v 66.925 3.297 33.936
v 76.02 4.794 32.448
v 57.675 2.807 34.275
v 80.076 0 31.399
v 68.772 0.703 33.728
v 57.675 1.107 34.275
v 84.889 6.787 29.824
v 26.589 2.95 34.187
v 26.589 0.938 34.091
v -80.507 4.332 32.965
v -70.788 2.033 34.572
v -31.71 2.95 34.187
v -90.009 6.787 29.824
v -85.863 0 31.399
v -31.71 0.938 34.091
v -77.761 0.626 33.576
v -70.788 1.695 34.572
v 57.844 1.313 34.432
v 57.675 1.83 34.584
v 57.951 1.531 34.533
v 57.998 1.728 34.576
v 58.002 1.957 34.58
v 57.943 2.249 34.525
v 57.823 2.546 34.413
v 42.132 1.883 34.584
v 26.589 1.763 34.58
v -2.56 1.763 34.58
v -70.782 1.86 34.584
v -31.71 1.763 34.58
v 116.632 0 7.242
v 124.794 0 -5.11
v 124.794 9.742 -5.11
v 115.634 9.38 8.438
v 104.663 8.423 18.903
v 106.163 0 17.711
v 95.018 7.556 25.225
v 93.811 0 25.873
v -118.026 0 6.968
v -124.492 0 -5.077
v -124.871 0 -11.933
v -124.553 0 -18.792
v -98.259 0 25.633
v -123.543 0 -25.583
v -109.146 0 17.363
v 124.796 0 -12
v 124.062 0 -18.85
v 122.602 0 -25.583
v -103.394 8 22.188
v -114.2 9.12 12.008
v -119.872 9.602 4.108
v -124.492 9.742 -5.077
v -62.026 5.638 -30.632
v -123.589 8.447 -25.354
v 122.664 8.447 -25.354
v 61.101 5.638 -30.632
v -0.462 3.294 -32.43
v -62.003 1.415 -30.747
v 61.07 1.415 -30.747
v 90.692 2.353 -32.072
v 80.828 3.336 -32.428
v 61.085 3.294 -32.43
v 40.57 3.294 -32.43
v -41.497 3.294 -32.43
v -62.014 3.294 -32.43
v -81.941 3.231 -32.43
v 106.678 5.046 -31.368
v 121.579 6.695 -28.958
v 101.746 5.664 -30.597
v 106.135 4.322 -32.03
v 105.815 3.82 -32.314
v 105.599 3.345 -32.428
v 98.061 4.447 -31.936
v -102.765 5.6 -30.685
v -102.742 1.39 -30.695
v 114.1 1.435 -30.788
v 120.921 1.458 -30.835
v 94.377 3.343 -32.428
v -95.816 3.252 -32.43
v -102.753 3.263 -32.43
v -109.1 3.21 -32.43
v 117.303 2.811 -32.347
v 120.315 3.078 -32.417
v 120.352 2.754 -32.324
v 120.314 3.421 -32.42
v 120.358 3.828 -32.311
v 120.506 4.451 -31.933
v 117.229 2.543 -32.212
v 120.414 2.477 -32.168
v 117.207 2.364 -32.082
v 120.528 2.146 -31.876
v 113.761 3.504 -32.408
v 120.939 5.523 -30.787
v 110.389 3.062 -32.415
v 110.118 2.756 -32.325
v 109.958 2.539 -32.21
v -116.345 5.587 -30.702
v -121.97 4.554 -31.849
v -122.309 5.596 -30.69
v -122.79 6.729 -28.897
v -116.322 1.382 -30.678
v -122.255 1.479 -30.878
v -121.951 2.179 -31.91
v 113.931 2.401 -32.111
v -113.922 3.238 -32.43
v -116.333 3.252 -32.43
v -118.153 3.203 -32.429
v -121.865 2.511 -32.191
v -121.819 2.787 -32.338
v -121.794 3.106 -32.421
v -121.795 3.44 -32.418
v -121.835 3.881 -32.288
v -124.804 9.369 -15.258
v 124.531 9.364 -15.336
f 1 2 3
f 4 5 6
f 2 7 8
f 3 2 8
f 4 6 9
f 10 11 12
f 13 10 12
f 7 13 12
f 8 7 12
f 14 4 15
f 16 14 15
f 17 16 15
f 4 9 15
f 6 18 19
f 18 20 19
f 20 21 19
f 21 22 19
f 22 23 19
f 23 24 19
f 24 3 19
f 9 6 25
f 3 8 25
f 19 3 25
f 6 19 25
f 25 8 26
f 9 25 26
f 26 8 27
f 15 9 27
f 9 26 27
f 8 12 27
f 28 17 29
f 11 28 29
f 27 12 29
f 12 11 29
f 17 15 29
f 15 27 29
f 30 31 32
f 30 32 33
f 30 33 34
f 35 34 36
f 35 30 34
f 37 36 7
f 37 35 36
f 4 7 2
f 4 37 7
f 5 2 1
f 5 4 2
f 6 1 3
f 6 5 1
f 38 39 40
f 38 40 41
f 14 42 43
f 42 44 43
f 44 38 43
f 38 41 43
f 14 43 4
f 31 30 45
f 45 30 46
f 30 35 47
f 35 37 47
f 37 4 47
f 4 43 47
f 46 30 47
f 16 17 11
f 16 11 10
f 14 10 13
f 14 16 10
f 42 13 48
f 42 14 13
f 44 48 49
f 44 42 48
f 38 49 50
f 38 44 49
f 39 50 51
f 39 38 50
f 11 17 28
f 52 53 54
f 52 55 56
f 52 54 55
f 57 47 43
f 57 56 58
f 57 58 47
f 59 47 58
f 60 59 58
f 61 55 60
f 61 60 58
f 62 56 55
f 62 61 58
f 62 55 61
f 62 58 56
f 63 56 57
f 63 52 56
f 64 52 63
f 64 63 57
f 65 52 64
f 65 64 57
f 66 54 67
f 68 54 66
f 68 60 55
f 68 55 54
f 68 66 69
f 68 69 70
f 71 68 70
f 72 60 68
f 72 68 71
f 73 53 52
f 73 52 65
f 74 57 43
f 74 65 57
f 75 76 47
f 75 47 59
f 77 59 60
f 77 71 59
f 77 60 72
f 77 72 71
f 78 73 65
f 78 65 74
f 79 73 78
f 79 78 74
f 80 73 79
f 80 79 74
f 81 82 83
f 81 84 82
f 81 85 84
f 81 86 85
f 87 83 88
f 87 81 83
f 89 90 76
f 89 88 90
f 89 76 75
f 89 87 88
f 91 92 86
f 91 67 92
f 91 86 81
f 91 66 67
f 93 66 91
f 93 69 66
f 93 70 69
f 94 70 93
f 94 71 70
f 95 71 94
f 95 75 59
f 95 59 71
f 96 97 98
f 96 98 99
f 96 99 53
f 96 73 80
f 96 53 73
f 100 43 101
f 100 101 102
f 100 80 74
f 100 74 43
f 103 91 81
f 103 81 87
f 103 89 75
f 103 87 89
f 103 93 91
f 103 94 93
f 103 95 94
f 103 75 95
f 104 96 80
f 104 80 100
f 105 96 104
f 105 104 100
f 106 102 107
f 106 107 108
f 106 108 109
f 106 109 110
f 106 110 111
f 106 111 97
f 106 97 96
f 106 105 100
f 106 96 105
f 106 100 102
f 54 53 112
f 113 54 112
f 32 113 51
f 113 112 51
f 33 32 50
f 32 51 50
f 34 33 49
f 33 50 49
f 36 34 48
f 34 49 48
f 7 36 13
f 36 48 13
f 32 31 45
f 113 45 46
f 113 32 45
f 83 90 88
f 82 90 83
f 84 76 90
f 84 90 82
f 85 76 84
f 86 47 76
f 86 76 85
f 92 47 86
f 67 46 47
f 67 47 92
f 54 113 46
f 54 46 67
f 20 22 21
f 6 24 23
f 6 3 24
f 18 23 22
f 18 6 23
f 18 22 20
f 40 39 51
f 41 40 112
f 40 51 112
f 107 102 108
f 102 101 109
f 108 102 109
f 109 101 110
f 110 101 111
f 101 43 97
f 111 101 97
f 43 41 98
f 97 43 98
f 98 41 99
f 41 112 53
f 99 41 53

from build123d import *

# Parameters (mm, degrees)
SKETCH1_W                = 250
SKETCH1_H                = 70
BOSS_EXTRUDE1_DEPTH      = 10
CUT_EXTRUDE1_DEPTH       = 10
CUT_EXTRUDE2_DEPTH       = 10
CUT_EXTRUDE7_DEPTH       = 131.083540302
CUT_EXTRUDE7_DEPTH_BACK  = 131.083540302
CUT_EXTRUDE12_DEPTH      = 131.064564638
CUT_EXTRUDE12_DEPTH_BACK = 131.064564638
CUT_EXTRUDE15_DEPTH      = 10
CUT_EXTRUDE16_DEPTH      = 10
CUT_EXTRUDE21_DEPTH      = 131.064564638
CUT_EXTRUDE21_DEPTH_BACK = 131.064564638


with BuildPart() as part:
    # Sketch1 → Boss-Extrude1 (new body)
    with BuildSketch(Plane(origin=(0, 0, 0), x_dir=(1, 0, 0), z_dir=(0, 1, 0))):
        Rectangle(SKETCH1_W, SKETCH1_H)
    extrude(amount=BOSS_EXTRUDE1_DEPTH)

    # Sketch2 → Cut-Extrude1 (cut)
    with BuildSketch(Plane(origin=(0, 10, 0), x_dir=(1, 0, 0), z_dir=(0, 1, 0))):
        with BuildLine():
            Line((-125, -35), (-105.6811507, -35))
            ThreePointArc((-105.6811507, -35), (-123.319359291, -2.181448179), (-120.931126211, 35))
            Line((-120.931126211, 35), (-125, 35))
            Line((-125, 35), (-125, -35))
        make_face()
        with BuildLine():
            ThreePointArc((-102.585198357, -37.985491478), (-104.15687903, -36.517327288), (-105.6811507, -35))
            Line((-105.6811507, -35), (-125, -35))
            Line((-125, -35), (-125, 35))
            Line((-125, 35), (-120.931126211, 35))
            ThreePointArc((-120.931126211, 35), (-117.77369036, 42.419291873), (-113.756908851, 49.410769495))
            ThreePointArc((-113.756908851, 49.410769495), (-123.297106068, 68.789133967), (-141.939517672, 79.697702256))
            ThreePointArc((-141.939517672, 79.697702256), (-176.738011892, 49.445919486), (-154.950429467, 8.808414484))
            ThreePointArc((-154.950429467, 8.808414484), (-179.373061386, -41.265354418), (-129.299292485, -65.687986337))
            ThreePointArc((-129.299292485, -65.687986337), (-103.552743859, -63.784193915), (-102.585198357, -37.985491478))
        make_face()
    extrude(amount=-CUT_EXTRUDE1_DEPTH, mode=Mode.SUBTRACT)

    # Sketch3 → Cut-Extrude2 (cut)
    with BuildSketch(Plane(origin=(0, 10, 0), x_dir=(1, 0, 0), z_dir=(0, 1, 0))):
        with BuildLine():
            ThreePointArc((107.670924145, -35.29278609), (124.046120338, -1.80913671), (119.157389799, 35.142211572))
            ThreePointArc((119.157389799, 35.142211572), (134.08963077, 47.557806696), (153.427471124, 45.778269352))
            ThreePointArc((153.427471124, 45.778269352), (237.062768876, 49.332031087), (168.624576004, 1.127197211))
            ThreePointArc((168.624576004, 1.127197211), (150.729727191, -38.140394783), (107.670924145, -35.29278609))
        make_face()
    extrude(amount=-CUT_EXTRUDE2_DEPTH, mode=Mode.SUBTRACT)

    # Sketch7 → Cut-Extrude7 (cut, two sides: drawn at the far end of the back side and taken through both)
    with BuildSketch(Plane(origin=(0, 0, 0), x_dir=(0, 0, -1), z_dir=(1, 0, 0)).offset(-CUT_EXTRUDE7_DEPTH_BACK)):
        with BuildLine():
            ThreePointArc((33.533398698, 7.292236255), (-1.467141086, 9.688614292), (-36.298819038, 5.501177851))
            ThreePointArc((-36.298819038, 5.501177851), (-59.137780951, 12.031911856), (-75.102753404, 29.621349666))
            ThreePointArc((-75.102753404, 29.621349666), (-94.212515617, 81.478521501), (-38.963674899, 82.862314097))
            ThreePointArc((-38.963674899, 82.862314097), (26.341939645, 119.615559451), (63.095184998, 54.309944906))
            ThreePointArc((63.095184998, 54.309944906), (106.612811455, -5.853362128), (33.533398698, 7.292236255))
        make_face()
    extrude(amount=CUT_EXTRUDE7_DEPTH + CUT_EXTRUDE7_DEPTH_BACK, mode=Mode.SUBTRACT)

    # Sketch8 → Cut-Extrude12 (cut, two sides: drawn at the far end of the back side and taken through both)
    with BuildSketch(Plane(origin=(0, 0, 0), x_dir=(0, 0, -1), z_dir=(1, 0, 0)).offset(-CUT_EXTRUDE12_DEPTH_BACK)):
        with BuildLine():
            Line((-28.066580628, 7.960156192), (-42.709897039, 11.860300813))
            Line((-42.709897039, 11.860300813), (-42.709897039, -7.993078492))
            Line((-42.709897039, -7.993078492), (-28.71193991, -0.466643389))
            add(Edge.make_bspline(
                [(-28.066580628, 7.960156192), (-39.598055898, 0.513916796), (-33.220375755, 0.370849615), (-28.71193991, -0.466643389)],
                knots=[0, 0, 0, 0, 0.838507954, 0.838507954, 0.838507954, 0.838507954], degree=3))
        make_face()
    extrude(amount=CUT_EXTRUDE12_DEPTH + CUT_EXTRUDE12_DEPTH_BACK, mode=Mode.SUBTRACT)

    # Sketch9 → Cut-Extrude15 (cut)
    with BuildSketch(Plane(origin=(0, 0, 0), x_dir=(-1, 0, 0), z_dir=(0, -1, 0))):
        with BuildLine():
            Line((124.655946291, 5.484693498), (146.36395099, -21.002614193))
            Line((146.36395099, -21.002614193), (76.210821695, -48.228862541))
            Line((76.210821695, -48.228862541), (66.423803533, -43.378905656))
            Line((66.423803533, -43.378905656), (70.788178261, -34.57177278))
            ThreePointArc((70.788178261, -34.57177278), (103.40223816, -22.182216373), (124.655946291, 5.484693498))
        make_face()
    extrude(amount=-CUT_EXTRUDE15_DEPTH, mode=Mode.SUBTRACT)

    # Sketch10 → Cut-Extrude16 (cut)
    with BuildSketch(Plane(origin=(0, 0, 0), x_dir=(-1, 0, 0), z_dir=(0, -1, 0))):
        with BuildLine():
            Line((-57.675166137, -34.275423238), (-71.543821122, -47.200540174))
            Line((-71.543821122, -47.200540174), (-140.907758081, -43.326426614))
            Line((-140.907758081, -43.326426614), (-154.2664719, 14.83864241))
            Line((-154.2664719, 14.83864241), (-126.862900993, 9.383026654))
            ThreePointArc((-126.862900993, 9.383026654), (-98.892649646, -22.942974845), (-57.675166137, -34.275423238))
        make_face()
    extrude(amount=-CUT_EXTRUDE16_DEPTH, mode=Mode.SUBTRACT)

    # Sketch11 → Cut-Extrude21 (cut, two sides: drawn at the far end of the back side and taken through both)
    with BuildSketch(Plane(origin=(0, 0, 0), x_dir=(0, 0, -1), z_dir=(1, 0, 0)).offset(-CUT_EXTRUDE21_DEPTH_BACK)):
        with BuildLine():
            Line((25.230837074, 8.500137714), (41.025699478, 16.186384417))
            Line((41.025699478, 16.186384417), (42.557487911, 1.877911824))
            Line((42.557487911, 1.877911824), (37.210923704, -12.479147824))
            Line((37.210923704, -12.479147824), (27.144998545, -6.229370678))
            Line((27.144998545, -6.229370678), (24.539214353, -0.167468362))
            add(Edge.make_bspline(
                [(25.230837074, 8.500137714), (39.968005994, 2.152916652), (24.539214353, -0.167468362)],
                knots=[0, 0, 0, 1, 1, 1], degree=2))
        make_face()
    extrude(amount=CUT_EXTRUDE21_DEPTH + CUT_EXTRUDE21_DEPTH_BACK, mode=Mode.SUBTRACT)


solid = part.part
